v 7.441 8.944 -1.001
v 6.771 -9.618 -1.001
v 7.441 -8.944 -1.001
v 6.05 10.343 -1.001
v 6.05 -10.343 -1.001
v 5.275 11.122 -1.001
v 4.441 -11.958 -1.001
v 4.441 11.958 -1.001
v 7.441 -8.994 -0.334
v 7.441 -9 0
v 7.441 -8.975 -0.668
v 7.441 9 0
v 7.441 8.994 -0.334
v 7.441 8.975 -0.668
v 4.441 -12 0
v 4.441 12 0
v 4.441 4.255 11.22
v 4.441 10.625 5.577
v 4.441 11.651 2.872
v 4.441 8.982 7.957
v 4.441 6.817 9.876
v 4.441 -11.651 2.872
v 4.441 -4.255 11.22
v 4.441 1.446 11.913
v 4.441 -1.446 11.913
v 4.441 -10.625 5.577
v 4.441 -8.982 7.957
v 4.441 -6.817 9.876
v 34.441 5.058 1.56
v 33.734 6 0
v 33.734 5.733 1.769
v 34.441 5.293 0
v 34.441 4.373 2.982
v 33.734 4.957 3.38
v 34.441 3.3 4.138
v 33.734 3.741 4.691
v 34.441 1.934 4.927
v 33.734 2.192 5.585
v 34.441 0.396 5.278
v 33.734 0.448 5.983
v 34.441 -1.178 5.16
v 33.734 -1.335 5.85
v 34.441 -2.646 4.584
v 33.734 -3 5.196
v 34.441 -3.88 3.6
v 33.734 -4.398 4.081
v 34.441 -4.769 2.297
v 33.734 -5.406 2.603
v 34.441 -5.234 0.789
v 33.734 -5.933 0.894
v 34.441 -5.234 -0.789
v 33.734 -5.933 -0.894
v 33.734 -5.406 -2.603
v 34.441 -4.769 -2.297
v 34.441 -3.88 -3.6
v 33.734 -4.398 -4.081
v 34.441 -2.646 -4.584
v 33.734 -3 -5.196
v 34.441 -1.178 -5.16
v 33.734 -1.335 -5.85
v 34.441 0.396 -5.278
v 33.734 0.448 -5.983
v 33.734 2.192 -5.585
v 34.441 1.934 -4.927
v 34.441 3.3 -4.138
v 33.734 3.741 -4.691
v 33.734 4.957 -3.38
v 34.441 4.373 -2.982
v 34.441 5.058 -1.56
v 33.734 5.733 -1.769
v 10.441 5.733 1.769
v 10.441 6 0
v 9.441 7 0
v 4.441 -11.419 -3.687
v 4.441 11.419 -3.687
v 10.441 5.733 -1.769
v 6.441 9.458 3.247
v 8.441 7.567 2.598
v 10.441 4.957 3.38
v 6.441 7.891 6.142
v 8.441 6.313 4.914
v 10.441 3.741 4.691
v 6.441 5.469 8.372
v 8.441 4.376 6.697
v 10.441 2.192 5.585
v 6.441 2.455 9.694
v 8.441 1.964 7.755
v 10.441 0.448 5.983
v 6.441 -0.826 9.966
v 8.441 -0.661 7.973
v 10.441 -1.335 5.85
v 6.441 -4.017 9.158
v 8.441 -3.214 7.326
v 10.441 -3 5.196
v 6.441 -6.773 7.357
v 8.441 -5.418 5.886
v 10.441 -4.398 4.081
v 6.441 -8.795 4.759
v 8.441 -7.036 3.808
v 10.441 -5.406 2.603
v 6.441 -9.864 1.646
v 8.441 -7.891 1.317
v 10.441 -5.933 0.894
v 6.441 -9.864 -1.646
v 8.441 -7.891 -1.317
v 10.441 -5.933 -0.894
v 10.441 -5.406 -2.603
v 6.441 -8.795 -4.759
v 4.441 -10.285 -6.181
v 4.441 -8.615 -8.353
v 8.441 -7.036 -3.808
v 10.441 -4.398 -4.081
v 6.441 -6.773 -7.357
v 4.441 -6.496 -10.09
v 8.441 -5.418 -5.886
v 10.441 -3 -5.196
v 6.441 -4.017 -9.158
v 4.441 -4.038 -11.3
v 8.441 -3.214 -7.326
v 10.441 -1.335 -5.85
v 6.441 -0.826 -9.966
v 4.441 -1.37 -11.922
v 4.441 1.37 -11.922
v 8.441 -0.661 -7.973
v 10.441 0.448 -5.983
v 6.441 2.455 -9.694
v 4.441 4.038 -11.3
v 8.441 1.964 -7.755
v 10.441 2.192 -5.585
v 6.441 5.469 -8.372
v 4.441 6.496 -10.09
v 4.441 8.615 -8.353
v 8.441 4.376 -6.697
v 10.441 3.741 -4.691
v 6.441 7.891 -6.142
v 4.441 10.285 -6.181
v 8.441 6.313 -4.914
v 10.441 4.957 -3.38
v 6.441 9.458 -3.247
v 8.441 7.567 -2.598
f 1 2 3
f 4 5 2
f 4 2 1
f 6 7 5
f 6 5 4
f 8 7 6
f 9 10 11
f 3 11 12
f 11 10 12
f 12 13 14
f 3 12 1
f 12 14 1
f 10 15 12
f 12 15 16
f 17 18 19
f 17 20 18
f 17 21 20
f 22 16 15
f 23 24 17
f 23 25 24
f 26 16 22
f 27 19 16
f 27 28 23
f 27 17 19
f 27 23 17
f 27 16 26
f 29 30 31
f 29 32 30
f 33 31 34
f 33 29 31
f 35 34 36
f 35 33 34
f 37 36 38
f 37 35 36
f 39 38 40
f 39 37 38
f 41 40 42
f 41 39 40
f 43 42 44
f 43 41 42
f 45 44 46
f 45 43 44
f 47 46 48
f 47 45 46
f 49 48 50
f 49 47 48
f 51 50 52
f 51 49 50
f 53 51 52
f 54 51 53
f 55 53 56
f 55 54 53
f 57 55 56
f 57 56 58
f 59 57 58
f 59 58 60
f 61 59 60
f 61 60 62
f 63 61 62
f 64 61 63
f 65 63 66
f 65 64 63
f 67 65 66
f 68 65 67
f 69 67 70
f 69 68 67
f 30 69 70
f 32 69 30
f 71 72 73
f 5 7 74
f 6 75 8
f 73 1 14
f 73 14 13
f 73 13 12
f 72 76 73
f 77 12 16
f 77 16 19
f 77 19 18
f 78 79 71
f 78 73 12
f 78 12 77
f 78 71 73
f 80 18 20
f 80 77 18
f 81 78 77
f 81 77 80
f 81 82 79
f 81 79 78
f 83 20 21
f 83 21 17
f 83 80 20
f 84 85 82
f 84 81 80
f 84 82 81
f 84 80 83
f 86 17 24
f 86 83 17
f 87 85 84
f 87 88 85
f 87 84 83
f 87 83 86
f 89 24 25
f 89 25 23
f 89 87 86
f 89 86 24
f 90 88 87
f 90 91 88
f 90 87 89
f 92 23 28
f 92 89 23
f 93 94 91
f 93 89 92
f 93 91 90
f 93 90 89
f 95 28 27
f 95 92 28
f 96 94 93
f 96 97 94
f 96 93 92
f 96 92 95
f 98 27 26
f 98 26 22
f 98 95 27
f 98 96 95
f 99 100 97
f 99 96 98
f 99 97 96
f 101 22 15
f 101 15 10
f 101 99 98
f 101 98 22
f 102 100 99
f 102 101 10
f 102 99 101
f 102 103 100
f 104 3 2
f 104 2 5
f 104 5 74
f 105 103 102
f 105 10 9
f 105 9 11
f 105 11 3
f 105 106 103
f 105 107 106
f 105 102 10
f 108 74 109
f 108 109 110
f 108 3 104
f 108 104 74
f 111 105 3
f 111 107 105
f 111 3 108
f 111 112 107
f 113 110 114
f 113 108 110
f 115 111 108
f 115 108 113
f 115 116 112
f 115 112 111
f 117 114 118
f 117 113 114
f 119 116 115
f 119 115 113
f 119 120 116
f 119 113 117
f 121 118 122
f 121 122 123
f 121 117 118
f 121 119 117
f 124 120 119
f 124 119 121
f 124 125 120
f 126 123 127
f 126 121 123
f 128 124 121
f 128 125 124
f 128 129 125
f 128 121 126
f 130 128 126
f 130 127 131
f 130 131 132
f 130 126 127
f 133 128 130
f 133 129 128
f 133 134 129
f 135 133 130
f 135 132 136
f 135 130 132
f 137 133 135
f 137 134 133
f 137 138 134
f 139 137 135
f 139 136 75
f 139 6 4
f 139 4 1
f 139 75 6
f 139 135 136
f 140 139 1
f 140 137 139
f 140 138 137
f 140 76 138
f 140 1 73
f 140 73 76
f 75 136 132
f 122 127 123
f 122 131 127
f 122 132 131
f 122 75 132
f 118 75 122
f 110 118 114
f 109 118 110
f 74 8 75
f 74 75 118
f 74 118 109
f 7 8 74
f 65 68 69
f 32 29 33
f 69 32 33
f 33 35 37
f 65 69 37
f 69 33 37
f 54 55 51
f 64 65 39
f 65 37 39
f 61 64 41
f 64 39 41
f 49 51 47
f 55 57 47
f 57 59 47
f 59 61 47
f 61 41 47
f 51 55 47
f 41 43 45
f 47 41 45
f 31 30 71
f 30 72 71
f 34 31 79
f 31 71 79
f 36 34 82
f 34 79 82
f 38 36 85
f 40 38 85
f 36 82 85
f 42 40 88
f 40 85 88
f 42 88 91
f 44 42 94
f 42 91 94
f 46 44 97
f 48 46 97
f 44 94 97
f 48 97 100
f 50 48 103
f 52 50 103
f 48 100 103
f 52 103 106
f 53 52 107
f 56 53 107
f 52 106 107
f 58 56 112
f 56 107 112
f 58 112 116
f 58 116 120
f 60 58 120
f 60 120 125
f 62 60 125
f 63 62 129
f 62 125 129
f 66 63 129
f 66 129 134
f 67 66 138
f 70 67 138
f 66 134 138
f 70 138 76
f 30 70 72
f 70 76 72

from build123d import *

# Parameters (mm, degrees)
SKETCH3_W          = 3
SKETCH3_H          = 1.001019848
CUT_EXTRUDE1_DEPTH = 50


with BuildPart() as part:
    # Sketch2 → Revolve1 (revolve)
    with BuildSketch(Plane.XY):
        Polygon((10.441459651, 6), (25.219960982, 6), (33.73435287, 6), (34.441459651, 5.292893219), (34.441459651, 2.788575112), (34.441459651, 0), (4.441459651, 0), (4.441459651, 12), align=None)
    revolve(axis=Axis((-22.000325263, 0, 0), (1, 0, 0)))

    # Sketch3 → Cut-Extrude1 (cut, symmetric)
    with BuildSketch(Plane(origin=(0, 0, 0), x_dir=(1, 0, 0), z_dir=(0, 1, 0))):
        with Locations((5.941459651, 0.500509924)):
            Rectangle(SKETCH3_W, SKETCH3_H)
    extrude(amount=CUT_EXTRUDE1_DEPTH, both=True, mode=Mode.SUBTRACT)


solid = part.part
